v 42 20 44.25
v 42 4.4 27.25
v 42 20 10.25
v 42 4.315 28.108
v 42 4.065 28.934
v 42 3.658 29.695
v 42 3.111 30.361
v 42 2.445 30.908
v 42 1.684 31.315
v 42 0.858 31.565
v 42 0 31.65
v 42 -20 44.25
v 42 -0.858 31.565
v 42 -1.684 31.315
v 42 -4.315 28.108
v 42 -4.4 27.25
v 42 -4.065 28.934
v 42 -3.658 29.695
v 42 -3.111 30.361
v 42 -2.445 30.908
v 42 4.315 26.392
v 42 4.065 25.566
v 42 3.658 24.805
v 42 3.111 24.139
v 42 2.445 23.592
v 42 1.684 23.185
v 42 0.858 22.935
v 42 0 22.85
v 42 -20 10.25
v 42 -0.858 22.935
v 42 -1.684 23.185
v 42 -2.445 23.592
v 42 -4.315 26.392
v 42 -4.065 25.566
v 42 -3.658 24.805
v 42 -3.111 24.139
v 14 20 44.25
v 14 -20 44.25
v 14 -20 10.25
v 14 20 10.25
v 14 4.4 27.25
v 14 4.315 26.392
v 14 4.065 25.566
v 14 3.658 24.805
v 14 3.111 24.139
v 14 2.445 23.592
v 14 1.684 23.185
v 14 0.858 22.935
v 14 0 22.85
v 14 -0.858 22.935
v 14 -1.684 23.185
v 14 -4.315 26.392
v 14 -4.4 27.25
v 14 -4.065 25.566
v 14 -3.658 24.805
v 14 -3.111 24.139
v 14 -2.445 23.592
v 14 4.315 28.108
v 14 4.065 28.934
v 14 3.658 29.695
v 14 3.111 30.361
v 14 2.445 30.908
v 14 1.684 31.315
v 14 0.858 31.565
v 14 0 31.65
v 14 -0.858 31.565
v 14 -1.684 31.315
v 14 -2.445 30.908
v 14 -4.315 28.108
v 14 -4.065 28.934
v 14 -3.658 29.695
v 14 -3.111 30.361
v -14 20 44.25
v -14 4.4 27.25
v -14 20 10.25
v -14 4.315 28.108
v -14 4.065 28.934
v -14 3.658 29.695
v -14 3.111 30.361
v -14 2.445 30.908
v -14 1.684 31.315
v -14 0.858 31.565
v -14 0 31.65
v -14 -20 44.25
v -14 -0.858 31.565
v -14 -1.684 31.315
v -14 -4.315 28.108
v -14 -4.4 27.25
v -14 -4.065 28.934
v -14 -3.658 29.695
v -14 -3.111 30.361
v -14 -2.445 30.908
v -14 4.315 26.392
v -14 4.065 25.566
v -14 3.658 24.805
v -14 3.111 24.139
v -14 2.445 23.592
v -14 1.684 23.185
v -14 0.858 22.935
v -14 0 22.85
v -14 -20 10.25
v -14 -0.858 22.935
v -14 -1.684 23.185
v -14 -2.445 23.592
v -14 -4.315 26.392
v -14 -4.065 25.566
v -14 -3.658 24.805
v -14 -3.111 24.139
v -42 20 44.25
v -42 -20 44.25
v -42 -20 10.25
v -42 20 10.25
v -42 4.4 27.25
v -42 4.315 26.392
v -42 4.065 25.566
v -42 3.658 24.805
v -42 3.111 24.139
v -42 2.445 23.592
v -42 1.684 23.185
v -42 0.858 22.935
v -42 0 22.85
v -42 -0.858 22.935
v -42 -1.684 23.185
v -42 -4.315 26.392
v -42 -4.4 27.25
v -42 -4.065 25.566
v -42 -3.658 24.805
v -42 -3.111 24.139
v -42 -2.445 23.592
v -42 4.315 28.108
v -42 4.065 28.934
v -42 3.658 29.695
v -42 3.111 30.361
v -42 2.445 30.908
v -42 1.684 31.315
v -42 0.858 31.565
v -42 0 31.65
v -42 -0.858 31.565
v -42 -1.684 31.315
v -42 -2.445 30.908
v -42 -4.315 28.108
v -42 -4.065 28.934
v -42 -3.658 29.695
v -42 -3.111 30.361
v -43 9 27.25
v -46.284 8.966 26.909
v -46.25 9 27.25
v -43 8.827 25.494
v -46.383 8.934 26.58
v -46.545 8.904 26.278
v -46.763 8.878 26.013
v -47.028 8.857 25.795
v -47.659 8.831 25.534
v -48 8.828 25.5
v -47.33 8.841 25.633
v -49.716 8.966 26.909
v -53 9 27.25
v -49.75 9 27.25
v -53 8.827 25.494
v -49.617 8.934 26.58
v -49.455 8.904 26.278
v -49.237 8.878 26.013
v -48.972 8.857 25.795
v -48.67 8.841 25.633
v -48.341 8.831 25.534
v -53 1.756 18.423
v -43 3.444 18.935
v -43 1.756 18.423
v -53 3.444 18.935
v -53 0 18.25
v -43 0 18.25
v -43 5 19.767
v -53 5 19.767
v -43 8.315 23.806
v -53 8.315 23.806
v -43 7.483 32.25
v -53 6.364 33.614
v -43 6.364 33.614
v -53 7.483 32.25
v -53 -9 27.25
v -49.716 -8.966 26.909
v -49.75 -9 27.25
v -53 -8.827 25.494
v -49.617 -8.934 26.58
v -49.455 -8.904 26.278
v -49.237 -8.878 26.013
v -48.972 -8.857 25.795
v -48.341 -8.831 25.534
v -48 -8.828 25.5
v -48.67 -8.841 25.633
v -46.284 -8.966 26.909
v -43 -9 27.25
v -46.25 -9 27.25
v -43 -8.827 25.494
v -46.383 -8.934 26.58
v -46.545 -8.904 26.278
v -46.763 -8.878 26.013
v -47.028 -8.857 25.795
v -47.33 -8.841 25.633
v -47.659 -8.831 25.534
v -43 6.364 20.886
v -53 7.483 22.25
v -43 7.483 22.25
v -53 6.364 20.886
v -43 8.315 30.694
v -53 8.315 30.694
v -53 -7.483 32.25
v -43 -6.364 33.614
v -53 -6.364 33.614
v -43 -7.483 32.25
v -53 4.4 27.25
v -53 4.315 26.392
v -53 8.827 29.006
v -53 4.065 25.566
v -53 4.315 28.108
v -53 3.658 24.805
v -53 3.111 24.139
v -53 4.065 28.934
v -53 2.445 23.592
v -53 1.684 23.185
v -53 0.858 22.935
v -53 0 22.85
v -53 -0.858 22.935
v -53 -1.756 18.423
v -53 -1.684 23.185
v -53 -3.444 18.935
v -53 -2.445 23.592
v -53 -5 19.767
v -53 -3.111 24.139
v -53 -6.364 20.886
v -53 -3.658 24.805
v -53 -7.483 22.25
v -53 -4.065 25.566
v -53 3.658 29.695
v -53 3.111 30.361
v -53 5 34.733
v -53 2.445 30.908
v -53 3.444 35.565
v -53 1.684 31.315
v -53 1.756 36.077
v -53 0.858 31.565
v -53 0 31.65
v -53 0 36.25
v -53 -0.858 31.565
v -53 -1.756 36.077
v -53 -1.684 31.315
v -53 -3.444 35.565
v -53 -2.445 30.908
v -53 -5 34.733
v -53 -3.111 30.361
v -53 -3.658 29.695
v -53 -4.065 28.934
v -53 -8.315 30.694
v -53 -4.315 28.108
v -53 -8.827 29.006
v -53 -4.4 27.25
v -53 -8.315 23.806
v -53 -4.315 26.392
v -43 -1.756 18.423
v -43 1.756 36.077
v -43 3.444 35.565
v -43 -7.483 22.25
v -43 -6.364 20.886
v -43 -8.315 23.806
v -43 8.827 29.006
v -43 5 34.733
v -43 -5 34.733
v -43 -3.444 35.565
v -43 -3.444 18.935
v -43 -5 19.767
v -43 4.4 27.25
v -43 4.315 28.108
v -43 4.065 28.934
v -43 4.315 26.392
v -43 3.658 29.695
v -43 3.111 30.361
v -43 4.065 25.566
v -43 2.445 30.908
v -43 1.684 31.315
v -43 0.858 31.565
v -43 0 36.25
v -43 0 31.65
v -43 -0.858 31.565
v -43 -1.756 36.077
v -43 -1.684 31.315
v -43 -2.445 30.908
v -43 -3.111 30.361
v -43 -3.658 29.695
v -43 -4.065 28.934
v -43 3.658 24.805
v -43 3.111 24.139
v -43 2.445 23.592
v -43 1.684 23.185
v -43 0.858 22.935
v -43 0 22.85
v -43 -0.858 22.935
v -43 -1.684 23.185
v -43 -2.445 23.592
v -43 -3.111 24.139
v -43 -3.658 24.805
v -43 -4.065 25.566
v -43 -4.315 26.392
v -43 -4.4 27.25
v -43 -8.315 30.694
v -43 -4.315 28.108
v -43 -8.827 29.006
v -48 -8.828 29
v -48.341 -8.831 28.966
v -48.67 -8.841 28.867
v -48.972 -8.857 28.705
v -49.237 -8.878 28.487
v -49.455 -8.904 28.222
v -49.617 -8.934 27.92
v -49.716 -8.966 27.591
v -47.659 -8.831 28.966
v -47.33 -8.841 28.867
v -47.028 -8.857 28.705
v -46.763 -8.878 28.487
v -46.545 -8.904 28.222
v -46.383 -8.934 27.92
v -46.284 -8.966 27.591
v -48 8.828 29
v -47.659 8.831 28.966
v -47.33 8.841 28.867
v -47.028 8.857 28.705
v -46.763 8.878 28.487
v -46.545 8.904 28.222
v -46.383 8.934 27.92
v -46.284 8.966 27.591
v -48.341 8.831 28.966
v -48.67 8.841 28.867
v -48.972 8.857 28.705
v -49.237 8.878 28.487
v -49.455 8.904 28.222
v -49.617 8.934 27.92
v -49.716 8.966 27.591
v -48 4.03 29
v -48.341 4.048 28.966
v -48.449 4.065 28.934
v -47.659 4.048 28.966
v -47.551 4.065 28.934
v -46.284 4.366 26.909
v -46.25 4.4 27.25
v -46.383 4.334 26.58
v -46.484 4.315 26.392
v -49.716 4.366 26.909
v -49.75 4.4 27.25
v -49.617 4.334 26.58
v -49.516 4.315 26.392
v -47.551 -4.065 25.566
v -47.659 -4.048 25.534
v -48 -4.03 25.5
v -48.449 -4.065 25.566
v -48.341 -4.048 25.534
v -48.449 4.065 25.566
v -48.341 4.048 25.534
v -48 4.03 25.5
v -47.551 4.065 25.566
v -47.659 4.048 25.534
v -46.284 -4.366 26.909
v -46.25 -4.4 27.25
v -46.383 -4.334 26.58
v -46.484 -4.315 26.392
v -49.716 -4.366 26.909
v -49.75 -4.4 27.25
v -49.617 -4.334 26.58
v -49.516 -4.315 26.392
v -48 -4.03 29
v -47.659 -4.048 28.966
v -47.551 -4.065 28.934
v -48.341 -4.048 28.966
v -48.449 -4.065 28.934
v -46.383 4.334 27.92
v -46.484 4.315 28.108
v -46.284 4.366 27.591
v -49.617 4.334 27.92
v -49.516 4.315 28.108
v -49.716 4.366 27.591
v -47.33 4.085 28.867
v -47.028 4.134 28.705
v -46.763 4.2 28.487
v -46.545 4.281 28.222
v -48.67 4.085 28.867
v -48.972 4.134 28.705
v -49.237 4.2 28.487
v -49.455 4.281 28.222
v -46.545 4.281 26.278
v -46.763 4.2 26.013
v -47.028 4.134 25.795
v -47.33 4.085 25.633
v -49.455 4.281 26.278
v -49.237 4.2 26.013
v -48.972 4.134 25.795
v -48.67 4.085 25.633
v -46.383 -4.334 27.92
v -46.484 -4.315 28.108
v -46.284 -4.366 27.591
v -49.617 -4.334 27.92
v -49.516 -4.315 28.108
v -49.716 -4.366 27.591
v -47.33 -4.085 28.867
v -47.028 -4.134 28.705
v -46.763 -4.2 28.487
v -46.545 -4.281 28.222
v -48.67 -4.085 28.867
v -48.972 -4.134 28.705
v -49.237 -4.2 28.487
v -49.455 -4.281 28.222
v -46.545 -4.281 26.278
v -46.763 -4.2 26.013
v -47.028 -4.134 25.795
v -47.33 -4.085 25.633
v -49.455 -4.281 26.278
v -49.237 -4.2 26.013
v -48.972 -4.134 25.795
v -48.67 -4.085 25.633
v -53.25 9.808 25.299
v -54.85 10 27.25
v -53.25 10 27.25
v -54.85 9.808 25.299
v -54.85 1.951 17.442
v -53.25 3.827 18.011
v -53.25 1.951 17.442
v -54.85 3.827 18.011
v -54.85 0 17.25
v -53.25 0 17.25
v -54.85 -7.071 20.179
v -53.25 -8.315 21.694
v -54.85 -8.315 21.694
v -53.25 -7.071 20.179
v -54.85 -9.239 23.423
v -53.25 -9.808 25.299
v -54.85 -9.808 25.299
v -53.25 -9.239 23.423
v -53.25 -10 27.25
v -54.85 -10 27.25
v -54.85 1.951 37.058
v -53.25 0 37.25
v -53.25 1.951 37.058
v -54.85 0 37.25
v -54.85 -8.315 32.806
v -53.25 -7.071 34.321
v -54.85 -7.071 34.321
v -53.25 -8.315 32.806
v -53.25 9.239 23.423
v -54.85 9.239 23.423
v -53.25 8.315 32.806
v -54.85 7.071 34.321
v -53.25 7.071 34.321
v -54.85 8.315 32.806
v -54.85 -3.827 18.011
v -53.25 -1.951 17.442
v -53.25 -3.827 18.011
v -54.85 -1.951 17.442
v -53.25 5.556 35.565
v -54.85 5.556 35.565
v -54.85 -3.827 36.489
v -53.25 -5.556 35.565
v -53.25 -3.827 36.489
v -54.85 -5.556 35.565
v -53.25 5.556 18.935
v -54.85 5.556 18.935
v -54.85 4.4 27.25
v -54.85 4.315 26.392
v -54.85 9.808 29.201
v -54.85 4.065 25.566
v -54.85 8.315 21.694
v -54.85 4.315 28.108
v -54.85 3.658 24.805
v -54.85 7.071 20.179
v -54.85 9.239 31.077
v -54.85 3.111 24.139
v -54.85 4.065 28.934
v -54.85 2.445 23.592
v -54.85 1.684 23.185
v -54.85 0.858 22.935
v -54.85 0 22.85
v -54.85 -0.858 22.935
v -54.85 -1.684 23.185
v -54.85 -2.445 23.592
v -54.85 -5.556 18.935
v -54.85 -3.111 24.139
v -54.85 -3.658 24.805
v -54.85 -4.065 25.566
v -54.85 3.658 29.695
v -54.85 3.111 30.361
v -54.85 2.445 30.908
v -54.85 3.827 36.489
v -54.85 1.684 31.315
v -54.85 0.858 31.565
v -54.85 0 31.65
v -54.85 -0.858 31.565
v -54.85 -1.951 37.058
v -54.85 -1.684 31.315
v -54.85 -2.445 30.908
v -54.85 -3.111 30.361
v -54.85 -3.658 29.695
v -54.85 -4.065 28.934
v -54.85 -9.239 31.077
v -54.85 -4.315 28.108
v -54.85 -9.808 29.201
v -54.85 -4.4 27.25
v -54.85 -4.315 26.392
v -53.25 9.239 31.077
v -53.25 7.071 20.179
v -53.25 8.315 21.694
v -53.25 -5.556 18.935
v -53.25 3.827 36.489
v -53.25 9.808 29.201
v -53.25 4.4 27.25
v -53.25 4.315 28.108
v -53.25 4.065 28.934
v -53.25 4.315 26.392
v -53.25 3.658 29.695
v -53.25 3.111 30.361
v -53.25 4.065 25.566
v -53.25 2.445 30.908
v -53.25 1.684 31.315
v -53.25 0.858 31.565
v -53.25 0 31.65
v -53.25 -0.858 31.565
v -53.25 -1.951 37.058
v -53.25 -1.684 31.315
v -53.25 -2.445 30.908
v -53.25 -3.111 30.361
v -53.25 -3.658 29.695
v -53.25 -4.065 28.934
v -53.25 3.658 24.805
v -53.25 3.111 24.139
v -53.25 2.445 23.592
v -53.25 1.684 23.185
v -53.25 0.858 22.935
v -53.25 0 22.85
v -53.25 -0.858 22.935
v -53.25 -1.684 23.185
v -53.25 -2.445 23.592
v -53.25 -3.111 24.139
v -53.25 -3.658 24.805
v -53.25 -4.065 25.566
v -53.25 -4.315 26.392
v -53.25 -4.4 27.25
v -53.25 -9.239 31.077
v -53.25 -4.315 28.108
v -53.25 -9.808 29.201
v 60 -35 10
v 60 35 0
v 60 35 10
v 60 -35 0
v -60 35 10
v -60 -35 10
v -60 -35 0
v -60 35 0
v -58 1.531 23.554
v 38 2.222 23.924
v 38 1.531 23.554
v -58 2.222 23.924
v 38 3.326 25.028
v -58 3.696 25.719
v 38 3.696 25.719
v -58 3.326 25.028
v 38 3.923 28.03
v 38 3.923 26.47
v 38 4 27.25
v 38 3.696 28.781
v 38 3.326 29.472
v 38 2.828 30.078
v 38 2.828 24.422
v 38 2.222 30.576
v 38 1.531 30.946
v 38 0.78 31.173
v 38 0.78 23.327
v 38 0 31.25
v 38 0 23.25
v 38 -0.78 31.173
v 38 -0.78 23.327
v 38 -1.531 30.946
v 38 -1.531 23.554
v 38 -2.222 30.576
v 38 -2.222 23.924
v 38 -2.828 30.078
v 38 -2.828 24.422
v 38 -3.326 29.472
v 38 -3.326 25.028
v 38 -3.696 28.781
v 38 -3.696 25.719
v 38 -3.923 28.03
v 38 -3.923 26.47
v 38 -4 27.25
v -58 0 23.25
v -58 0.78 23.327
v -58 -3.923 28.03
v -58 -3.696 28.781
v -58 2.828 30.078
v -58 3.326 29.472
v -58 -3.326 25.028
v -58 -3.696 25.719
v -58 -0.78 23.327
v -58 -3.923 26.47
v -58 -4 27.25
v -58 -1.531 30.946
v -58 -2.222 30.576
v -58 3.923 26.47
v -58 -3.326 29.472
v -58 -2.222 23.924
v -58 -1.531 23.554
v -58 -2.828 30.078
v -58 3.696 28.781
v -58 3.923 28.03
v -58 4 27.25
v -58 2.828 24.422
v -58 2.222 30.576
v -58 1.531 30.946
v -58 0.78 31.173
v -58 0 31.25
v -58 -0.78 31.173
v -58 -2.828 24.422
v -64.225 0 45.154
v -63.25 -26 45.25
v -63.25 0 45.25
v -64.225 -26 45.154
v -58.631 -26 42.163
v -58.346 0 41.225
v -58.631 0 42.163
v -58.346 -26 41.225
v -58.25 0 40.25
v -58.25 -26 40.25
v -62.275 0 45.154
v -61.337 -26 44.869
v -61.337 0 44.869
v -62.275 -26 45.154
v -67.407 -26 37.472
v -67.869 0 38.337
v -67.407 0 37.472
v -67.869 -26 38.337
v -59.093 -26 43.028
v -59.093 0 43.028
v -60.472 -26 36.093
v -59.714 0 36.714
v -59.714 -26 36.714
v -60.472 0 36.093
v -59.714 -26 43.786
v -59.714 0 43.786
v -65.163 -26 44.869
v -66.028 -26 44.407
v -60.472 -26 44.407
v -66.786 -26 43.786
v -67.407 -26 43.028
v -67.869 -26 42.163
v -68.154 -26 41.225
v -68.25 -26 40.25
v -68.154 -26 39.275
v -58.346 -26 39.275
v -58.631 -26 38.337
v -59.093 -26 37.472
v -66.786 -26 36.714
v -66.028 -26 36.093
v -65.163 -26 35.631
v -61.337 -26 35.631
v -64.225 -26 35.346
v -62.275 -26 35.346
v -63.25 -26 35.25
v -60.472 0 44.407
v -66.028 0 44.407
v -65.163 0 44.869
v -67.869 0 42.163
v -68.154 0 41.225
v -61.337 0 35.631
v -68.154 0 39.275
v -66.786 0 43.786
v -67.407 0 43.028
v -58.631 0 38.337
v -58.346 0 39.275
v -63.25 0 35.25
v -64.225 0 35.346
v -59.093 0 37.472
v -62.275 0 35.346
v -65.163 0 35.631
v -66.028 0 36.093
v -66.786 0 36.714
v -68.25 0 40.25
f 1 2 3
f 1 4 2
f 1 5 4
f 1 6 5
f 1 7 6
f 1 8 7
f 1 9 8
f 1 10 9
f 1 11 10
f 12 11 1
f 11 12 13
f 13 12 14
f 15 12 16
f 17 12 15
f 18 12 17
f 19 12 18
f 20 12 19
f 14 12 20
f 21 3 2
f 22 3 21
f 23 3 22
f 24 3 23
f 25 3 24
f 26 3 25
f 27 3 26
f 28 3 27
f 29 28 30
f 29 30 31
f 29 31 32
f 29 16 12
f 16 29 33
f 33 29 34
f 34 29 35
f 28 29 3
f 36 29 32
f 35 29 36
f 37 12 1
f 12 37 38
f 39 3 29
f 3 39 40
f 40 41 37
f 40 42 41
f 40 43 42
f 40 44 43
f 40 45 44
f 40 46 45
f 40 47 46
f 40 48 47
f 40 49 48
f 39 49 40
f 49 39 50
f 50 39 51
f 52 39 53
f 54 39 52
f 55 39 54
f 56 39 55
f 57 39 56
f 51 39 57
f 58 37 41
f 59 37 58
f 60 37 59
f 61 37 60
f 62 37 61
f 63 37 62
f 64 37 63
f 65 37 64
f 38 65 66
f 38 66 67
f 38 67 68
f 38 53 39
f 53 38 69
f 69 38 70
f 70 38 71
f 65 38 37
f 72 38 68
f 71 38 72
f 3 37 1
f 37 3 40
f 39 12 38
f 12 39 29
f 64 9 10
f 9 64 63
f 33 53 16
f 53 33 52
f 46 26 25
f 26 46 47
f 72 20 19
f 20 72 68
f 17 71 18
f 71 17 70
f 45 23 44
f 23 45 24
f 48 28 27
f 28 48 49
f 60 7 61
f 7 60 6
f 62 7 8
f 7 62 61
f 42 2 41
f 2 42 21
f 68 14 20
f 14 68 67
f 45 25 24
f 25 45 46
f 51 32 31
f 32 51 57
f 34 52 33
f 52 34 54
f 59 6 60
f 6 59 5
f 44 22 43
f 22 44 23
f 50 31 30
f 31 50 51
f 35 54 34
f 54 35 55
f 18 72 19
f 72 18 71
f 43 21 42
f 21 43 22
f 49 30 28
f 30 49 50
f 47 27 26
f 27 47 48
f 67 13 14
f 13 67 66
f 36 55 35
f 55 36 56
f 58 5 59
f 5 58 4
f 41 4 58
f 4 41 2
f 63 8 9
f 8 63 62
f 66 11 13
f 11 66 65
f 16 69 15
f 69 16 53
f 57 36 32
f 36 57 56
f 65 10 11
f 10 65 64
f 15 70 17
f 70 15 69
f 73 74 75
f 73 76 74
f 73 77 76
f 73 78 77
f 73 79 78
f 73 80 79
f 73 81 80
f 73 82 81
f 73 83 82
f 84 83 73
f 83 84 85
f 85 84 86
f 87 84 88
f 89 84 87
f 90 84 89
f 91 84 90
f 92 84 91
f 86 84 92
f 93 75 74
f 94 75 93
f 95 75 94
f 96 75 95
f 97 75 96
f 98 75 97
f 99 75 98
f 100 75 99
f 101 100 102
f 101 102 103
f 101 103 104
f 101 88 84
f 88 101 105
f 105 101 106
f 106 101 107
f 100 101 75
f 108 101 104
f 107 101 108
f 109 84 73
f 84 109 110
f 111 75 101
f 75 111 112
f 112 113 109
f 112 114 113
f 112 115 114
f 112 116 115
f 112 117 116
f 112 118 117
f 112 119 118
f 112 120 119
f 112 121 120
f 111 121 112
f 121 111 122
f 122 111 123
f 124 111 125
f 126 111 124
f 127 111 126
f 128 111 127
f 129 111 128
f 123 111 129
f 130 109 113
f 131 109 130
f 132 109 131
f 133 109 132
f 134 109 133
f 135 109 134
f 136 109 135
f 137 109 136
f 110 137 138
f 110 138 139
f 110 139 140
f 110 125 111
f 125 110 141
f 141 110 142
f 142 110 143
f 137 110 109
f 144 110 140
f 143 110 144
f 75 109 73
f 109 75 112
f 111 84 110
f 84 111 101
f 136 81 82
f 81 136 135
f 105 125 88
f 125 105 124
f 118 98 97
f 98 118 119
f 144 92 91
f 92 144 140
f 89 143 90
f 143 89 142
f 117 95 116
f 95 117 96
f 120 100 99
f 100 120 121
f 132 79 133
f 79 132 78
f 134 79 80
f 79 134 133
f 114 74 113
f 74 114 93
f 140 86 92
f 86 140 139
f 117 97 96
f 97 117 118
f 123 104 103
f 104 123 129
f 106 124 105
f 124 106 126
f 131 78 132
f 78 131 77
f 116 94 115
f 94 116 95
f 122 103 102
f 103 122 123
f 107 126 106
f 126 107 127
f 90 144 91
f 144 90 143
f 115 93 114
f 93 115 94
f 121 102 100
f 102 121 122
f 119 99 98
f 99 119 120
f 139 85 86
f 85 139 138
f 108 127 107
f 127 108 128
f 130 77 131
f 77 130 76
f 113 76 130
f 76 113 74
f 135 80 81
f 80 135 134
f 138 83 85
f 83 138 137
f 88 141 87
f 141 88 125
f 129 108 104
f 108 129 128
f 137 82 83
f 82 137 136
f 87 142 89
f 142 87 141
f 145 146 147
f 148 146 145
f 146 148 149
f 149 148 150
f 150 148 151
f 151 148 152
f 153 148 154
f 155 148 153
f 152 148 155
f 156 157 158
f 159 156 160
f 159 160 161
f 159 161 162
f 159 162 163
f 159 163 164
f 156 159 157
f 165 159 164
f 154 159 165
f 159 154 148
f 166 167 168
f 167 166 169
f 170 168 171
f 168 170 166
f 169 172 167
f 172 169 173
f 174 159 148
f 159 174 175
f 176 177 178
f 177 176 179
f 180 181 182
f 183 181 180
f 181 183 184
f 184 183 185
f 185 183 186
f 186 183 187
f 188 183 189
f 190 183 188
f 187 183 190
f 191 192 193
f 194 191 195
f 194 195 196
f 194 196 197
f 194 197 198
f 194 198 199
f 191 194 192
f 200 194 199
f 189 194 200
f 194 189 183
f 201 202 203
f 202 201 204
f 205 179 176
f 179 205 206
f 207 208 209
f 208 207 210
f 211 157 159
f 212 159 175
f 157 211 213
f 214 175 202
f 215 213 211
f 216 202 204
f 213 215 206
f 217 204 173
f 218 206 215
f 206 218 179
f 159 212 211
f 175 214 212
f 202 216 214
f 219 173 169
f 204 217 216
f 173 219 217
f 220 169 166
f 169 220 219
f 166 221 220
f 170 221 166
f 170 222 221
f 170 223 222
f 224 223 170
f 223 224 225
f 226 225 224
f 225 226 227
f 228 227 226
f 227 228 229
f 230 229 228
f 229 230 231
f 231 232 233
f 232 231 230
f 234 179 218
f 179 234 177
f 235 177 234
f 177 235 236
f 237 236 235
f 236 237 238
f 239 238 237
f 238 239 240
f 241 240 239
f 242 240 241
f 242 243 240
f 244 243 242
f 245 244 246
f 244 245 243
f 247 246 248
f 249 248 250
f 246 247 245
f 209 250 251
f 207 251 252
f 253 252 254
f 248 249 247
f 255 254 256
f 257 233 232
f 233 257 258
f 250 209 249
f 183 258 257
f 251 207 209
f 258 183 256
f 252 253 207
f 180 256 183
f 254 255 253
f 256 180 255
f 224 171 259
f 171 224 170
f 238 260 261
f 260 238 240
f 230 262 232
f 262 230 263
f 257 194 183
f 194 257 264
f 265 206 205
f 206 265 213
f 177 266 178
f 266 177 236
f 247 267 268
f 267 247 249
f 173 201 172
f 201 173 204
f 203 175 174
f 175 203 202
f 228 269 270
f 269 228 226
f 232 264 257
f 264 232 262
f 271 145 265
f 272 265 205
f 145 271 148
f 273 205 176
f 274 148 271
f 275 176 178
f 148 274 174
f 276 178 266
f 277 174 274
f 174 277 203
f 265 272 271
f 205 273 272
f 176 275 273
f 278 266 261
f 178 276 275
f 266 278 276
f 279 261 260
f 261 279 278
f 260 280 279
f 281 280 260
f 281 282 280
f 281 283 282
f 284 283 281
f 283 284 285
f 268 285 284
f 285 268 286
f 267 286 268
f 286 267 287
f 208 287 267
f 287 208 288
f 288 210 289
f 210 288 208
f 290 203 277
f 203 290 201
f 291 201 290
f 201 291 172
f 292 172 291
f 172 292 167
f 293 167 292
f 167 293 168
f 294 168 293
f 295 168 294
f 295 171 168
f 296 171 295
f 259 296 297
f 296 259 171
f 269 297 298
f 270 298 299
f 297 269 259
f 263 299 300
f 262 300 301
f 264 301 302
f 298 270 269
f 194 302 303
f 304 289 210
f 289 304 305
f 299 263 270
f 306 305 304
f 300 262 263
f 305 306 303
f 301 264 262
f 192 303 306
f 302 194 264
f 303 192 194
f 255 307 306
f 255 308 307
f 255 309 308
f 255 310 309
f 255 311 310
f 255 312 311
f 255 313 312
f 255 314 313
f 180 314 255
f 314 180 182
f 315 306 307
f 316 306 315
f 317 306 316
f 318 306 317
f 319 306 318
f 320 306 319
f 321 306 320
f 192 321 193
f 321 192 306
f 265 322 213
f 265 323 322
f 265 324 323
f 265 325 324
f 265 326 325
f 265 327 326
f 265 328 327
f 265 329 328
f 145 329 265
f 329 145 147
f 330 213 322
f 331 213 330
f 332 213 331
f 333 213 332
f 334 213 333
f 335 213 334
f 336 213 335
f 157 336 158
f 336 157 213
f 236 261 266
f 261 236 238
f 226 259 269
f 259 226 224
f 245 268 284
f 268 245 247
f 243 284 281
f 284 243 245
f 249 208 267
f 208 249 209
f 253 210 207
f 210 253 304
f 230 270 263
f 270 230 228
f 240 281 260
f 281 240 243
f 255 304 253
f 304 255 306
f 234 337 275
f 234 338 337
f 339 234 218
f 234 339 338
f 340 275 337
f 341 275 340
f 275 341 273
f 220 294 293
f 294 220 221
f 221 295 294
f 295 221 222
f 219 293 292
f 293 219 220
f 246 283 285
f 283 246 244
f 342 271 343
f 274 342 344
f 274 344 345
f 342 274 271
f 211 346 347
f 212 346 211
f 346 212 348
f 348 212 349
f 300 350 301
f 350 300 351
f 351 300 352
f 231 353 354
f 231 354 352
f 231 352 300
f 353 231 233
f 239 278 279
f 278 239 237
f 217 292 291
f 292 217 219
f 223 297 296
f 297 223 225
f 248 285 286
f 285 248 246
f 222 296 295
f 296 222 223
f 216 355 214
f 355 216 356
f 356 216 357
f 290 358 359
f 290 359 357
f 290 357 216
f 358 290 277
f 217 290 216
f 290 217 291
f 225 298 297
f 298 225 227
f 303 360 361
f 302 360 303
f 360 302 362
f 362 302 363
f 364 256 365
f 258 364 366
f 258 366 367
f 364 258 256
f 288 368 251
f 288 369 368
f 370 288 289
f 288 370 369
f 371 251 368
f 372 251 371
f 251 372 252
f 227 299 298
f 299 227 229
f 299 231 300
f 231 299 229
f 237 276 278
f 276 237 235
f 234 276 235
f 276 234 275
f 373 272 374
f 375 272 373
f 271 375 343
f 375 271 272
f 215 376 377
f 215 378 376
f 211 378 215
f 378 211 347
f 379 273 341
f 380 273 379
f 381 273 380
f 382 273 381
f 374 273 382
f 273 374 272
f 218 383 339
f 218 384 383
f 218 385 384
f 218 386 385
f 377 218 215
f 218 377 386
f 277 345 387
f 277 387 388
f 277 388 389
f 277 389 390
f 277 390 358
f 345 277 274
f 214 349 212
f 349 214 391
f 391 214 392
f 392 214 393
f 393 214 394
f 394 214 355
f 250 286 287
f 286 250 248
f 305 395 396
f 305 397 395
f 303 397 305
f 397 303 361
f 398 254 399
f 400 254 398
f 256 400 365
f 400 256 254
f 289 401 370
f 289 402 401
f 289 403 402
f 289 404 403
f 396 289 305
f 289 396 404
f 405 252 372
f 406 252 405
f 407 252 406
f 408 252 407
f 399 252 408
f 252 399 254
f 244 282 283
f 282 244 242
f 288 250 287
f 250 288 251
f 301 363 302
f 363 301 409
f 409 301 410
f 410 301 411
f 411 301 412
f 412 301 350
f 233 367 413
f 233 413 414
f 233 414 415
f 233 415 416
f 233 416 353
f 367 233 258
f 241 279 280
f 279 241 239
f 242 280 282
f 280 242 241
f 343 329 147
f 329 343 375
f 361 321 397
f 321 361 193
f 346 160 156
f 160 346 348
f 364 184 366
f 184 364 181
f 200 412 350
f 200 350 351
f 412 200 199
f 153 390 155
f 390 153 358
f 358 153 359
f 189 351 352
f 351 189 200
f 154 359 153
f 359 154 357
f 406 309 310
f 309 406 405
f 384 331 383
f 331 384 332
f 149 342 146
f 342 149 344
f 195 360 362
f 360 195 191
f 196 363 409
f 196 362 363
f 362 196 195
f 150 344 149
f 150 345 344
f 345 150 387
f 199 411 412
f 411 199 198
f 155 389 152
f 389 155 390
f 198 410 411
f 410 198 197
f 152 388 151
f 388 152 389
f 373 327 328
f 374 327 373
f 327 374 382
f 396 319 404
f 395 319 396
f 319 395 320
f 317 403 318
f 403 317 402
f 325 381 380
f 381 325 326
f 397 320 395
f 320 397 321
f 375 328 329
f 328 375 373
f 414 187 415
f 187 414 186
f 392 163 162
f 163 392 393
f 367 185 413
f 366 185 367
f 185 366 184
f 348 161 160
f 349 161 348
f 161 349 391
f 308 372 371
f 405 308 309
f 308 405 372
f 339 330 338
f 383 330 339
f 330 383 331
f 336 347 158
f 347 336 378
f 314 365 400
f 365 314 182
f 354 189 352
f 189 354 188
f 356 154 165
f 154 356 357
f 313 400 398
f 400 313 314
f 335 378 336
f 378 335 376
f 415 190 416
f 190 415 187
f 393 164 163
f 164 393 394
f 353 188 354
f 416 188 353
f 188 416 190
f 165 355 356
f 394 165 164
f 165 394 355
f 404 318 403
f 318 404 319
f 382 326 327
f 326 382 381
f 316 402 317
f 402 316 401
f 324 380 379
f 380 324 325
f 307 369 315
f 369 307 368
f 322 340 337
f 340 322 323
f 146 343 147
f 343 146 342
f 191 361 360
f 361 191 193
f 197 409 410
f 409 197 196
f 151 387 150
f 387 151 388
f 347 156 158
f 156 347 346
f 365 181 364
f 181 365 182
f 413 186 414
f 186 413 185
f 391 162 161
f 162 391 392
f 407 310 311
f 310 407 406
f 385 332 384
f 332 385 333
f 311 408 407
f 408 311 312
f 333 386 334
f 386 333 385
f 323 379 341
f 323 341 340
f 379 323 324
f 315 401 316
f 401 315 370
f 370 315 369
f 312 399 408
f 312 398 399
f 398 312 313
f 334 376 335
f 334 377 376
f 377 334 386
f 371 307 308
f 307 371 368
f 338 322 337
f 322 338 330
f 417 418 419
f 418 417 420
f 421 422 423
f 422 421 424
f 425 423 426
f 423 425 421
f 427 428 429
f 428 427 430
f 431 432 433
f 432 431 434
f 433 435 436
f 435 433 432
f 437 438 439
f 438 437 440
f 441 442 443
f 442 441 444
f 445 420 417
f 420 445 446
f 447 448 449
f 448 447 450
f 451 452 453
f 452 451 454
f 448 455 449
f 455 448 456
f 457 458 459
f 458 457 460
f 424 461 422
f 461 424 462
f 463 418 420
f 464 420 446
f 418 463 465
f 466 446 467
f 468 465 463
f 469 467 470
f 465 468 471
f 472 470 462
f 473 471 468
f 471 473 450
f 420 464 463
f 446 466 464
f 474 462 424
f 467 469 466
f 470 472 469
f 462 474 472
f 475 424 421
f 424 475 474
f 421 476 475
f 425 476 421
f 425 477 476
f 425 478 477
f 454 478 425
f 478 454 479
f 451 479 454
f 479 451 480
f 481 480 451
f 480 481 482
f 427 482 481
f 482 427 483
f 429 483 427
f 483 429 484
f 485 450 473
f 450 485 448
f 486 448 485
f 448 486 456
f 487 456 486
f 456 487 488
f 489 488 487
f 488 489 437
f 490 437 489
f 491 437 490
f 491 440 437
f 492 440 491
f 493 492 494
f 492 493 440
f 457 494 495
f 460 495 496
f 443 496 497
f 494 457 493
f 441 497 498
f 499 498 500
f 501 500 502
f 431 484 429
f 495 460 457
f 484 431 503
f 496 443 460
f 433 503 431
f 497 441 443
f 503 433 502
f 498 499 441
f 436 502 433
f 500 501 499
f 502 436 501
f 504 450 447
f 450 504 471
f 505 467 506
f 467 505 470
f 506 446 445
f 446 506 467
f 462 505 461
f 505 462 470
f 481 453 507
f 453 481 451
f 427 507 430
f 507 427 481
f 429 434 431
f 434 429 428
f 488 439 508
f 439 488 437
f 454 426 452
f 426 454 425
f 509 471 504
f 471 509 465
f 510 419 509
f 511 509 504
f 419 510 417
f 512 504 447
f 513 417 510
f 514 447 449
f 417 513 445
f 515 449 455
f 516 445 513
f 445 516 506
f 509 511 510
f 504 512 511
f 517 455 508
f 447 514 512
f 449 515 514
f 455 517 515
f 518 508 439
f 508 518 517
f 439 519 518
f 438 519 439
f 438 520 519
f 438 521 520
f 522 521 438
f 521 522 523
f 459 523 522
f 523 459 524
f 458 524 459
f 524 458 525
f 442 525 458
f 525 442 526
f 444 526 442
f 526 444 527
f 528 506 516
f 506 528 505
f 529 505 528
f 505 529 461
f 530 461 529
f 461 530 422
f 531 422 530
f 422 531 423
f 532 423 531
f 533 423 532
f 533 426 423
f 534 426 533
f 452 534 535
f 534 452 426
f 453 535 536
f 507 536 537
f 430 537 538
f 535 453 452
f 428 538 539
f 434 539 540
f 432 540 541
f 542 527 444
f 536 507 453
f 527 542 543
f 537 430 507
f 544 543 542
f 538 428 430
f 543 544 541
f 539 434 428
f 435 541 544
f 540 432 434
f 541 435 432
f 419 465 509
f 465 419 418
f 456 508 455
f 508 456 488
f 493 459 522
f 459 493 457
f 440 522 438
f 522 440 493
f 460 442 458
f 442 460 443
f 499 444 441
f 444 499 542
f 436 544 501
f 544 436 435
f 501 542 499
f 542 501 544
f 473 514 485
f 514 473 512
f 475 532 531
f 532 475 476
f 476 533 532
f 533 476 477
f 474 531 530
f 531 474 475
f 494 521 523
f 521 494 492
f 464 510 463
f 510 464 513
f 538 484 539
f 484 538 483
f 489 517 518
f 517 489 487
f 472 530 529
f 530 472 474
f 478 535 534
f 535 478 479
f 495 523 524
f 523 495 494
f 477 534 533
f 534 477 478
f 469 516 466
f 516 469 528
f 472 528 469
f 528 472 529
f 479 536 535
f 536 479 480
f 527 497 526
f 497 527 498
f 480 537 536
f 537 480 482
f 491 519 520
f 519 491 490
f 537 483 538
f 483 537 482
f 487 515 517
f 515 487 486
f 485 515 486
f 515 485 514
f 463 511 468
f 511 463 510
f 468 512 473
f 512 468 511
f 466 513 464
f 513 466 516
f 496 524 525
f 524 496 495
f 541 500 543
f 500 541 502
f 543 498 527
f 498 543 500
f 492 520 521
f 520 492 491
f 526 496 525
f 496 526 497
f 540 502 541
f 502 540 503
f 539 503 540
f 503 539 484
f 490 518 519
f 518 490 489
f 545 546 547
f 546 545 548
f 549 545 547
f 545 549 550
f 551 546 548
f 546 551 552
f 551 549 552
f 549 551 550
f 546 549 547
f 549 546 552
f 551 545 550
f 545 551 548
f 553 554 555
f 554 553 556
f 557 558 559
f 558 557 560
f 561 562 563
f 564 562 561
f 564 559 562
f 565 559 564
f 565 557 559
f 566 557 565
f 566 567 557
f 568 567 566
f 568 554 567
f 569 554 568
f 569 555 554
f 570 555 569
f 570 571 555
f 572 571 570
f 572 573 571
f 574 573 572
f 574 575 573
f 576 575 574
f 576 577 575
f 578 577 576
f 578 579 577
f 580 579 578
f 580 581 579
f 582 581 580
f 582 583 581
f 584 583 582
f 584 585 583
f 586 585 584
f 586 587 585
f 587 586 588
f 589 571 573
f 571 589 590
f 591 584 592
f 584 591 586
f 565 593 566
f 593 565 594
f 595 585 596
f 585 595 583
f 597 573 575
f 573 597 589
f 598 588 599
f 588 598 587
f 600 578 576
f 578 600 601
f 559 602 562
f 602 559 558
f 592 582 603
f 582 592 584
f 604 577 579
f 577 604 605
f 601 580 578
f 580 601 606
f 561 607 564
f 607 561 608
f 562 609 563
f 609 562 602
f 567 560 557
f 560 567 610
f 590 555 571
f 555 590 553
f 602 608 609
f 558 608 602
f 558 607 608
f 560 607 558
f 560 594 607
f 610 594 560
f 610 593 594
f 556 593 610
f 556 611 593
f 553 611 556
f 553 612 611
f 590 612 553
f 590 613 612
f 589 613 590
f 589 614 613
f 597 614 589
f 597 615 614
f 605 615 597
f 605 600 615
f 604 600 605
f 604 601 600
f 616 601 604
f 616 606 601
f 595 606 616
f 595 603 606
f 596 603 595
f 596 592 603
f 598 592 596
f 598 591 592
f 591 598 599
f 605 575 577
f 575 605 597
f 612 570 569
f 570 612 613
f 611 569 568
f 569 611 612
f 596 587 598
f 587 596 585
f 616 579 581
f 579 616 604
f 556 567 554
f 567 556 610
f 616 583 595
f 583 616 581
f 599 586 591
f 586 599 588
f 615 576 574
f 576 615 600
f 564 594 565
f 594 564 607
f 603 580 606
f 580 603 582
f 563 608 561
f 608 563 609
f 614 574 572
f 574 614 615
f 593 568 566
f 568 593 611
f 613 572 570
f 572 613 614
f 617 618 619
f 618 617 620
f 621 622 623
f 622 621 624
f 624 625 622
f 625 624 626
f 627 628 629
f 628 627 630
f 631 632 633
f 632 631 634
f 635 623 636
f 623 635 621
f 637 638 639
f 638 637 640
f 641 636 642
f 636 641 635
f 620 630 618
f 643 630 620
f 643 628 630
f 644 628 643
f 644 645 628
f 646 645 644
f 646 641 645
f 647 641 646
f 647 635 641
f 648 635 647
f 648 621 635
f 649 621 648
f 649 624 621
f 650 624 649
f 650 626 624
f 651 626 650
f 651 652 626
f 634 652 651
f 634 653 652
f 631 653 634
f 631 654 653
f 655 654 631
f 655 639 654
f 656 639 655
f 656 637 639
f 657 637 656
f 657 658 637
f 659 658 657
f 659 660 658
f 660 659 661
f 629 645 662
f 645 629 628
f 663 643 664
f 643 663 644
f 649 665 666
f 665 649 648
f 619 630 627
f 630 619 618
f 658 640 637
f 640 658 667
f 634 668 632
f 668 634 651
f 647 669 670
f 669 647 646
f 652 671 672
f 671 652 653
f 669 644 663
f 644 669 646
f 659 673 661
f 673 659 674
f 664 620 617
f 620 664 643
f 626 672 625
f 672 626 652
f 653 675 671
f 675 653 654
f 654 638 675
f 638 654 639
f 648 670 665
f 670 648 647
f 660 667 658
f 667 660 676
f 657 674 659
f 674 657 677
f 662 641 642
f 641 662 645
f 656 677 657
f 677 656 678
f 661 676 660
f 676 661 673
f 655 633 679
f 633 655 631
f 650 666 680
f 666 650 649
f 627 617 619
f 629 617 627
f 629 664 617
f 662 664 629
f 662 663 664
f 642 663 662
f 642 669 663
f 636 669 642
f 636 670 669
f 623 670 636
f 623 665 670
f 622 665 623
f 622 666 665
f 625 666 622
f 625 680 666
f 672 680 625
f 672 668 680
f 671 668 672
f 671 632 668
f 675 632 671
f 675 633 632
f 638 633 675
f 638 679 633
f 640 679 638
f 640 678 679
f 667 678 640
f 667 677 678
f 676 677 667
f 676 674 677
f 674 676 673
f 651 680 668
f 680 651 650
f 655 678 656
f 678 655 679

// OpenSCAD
$fn = 32;

// ------------------------------------------------------------------------
// Machine vise: screw d8, jaws 28 x 34 mm
// Every part is its own module, assembly() places every instance.
// ------------------------------------------------------------------------

// --- part 1 ---
module vise_bed() {
  difference() {
    translate([-60, -35, 0]) cube([120, 70, 10]);
  }
}

// --- part 2 ---
module vise_jaw() {
  difference() {
    translate([-14, -20, 0]) cube([28, 40, 34]);
    translate([0, 0, 17]) rotate([0, 90, 0]) cylinder(h = 30, d = 8.8, center = true);
  }
}

// --- part 3 ---
module vise_screw() {
  translate([0, 0, -48]) cylinder(h = 96, d = 8);
}

// --- part 4 ---
module screw_collar() {
  difference() {
    cylinder(h = 10, d = 18);
    translate([0, 0, -1]) cylinder(h = 12, d = 8.8);
    translate([0, 0, 5]) rotate([90, 0, 0]) cylinder(h = 20, d = 3.5, center = true);
  }
}

// --- part 5 ---
module screw_washer() {
  difference() {
      translate([0, 0, 0]) cylinder(h = 1.6, d = 20);
      translate([0, 0, -1]) cylinder(h = 3.6, d = 8.8);
    }
}

// --- part 6 ---
module vise_handle() {
  cylinder(h = 26, d = 10);
}

// --- assembly ---
module assembly() {
  color([0.80, 0.24, 0.20]) translate([0, 0, 0]) rotate([0, 0, 0]) vise_bed();
  color([0.20, 0.45, 0.75]) translate([28, 0, 10.25]) rotate([0, 0, 0]) vise_jaw();
  color([0.25, 0.62, 0.32]) translate([-28, 0, 10.25]) rotate([0, 0, 0]) vise_jaw();
  color([0.92, 0.70, 0.18]) translate([-10, 0, 27.25]) rotate([0, 90, 0]) vise_screw();
  color([0.58, 0.35, 0.70]) translate([-53, 0, 27.25]) rotate([0, 90, 0]) screw_collar();
  color([0.16, 0.66, 0.66]) translate([-54.85, 0, 27.25]) rotate([0, 90, 0]) screw_washer();
  color([0.85, 0.48, 0.18]) translate([-63.25, 0, 40.25]) rotate([90, 0, 0]) vise_handle();
}

assembly();
